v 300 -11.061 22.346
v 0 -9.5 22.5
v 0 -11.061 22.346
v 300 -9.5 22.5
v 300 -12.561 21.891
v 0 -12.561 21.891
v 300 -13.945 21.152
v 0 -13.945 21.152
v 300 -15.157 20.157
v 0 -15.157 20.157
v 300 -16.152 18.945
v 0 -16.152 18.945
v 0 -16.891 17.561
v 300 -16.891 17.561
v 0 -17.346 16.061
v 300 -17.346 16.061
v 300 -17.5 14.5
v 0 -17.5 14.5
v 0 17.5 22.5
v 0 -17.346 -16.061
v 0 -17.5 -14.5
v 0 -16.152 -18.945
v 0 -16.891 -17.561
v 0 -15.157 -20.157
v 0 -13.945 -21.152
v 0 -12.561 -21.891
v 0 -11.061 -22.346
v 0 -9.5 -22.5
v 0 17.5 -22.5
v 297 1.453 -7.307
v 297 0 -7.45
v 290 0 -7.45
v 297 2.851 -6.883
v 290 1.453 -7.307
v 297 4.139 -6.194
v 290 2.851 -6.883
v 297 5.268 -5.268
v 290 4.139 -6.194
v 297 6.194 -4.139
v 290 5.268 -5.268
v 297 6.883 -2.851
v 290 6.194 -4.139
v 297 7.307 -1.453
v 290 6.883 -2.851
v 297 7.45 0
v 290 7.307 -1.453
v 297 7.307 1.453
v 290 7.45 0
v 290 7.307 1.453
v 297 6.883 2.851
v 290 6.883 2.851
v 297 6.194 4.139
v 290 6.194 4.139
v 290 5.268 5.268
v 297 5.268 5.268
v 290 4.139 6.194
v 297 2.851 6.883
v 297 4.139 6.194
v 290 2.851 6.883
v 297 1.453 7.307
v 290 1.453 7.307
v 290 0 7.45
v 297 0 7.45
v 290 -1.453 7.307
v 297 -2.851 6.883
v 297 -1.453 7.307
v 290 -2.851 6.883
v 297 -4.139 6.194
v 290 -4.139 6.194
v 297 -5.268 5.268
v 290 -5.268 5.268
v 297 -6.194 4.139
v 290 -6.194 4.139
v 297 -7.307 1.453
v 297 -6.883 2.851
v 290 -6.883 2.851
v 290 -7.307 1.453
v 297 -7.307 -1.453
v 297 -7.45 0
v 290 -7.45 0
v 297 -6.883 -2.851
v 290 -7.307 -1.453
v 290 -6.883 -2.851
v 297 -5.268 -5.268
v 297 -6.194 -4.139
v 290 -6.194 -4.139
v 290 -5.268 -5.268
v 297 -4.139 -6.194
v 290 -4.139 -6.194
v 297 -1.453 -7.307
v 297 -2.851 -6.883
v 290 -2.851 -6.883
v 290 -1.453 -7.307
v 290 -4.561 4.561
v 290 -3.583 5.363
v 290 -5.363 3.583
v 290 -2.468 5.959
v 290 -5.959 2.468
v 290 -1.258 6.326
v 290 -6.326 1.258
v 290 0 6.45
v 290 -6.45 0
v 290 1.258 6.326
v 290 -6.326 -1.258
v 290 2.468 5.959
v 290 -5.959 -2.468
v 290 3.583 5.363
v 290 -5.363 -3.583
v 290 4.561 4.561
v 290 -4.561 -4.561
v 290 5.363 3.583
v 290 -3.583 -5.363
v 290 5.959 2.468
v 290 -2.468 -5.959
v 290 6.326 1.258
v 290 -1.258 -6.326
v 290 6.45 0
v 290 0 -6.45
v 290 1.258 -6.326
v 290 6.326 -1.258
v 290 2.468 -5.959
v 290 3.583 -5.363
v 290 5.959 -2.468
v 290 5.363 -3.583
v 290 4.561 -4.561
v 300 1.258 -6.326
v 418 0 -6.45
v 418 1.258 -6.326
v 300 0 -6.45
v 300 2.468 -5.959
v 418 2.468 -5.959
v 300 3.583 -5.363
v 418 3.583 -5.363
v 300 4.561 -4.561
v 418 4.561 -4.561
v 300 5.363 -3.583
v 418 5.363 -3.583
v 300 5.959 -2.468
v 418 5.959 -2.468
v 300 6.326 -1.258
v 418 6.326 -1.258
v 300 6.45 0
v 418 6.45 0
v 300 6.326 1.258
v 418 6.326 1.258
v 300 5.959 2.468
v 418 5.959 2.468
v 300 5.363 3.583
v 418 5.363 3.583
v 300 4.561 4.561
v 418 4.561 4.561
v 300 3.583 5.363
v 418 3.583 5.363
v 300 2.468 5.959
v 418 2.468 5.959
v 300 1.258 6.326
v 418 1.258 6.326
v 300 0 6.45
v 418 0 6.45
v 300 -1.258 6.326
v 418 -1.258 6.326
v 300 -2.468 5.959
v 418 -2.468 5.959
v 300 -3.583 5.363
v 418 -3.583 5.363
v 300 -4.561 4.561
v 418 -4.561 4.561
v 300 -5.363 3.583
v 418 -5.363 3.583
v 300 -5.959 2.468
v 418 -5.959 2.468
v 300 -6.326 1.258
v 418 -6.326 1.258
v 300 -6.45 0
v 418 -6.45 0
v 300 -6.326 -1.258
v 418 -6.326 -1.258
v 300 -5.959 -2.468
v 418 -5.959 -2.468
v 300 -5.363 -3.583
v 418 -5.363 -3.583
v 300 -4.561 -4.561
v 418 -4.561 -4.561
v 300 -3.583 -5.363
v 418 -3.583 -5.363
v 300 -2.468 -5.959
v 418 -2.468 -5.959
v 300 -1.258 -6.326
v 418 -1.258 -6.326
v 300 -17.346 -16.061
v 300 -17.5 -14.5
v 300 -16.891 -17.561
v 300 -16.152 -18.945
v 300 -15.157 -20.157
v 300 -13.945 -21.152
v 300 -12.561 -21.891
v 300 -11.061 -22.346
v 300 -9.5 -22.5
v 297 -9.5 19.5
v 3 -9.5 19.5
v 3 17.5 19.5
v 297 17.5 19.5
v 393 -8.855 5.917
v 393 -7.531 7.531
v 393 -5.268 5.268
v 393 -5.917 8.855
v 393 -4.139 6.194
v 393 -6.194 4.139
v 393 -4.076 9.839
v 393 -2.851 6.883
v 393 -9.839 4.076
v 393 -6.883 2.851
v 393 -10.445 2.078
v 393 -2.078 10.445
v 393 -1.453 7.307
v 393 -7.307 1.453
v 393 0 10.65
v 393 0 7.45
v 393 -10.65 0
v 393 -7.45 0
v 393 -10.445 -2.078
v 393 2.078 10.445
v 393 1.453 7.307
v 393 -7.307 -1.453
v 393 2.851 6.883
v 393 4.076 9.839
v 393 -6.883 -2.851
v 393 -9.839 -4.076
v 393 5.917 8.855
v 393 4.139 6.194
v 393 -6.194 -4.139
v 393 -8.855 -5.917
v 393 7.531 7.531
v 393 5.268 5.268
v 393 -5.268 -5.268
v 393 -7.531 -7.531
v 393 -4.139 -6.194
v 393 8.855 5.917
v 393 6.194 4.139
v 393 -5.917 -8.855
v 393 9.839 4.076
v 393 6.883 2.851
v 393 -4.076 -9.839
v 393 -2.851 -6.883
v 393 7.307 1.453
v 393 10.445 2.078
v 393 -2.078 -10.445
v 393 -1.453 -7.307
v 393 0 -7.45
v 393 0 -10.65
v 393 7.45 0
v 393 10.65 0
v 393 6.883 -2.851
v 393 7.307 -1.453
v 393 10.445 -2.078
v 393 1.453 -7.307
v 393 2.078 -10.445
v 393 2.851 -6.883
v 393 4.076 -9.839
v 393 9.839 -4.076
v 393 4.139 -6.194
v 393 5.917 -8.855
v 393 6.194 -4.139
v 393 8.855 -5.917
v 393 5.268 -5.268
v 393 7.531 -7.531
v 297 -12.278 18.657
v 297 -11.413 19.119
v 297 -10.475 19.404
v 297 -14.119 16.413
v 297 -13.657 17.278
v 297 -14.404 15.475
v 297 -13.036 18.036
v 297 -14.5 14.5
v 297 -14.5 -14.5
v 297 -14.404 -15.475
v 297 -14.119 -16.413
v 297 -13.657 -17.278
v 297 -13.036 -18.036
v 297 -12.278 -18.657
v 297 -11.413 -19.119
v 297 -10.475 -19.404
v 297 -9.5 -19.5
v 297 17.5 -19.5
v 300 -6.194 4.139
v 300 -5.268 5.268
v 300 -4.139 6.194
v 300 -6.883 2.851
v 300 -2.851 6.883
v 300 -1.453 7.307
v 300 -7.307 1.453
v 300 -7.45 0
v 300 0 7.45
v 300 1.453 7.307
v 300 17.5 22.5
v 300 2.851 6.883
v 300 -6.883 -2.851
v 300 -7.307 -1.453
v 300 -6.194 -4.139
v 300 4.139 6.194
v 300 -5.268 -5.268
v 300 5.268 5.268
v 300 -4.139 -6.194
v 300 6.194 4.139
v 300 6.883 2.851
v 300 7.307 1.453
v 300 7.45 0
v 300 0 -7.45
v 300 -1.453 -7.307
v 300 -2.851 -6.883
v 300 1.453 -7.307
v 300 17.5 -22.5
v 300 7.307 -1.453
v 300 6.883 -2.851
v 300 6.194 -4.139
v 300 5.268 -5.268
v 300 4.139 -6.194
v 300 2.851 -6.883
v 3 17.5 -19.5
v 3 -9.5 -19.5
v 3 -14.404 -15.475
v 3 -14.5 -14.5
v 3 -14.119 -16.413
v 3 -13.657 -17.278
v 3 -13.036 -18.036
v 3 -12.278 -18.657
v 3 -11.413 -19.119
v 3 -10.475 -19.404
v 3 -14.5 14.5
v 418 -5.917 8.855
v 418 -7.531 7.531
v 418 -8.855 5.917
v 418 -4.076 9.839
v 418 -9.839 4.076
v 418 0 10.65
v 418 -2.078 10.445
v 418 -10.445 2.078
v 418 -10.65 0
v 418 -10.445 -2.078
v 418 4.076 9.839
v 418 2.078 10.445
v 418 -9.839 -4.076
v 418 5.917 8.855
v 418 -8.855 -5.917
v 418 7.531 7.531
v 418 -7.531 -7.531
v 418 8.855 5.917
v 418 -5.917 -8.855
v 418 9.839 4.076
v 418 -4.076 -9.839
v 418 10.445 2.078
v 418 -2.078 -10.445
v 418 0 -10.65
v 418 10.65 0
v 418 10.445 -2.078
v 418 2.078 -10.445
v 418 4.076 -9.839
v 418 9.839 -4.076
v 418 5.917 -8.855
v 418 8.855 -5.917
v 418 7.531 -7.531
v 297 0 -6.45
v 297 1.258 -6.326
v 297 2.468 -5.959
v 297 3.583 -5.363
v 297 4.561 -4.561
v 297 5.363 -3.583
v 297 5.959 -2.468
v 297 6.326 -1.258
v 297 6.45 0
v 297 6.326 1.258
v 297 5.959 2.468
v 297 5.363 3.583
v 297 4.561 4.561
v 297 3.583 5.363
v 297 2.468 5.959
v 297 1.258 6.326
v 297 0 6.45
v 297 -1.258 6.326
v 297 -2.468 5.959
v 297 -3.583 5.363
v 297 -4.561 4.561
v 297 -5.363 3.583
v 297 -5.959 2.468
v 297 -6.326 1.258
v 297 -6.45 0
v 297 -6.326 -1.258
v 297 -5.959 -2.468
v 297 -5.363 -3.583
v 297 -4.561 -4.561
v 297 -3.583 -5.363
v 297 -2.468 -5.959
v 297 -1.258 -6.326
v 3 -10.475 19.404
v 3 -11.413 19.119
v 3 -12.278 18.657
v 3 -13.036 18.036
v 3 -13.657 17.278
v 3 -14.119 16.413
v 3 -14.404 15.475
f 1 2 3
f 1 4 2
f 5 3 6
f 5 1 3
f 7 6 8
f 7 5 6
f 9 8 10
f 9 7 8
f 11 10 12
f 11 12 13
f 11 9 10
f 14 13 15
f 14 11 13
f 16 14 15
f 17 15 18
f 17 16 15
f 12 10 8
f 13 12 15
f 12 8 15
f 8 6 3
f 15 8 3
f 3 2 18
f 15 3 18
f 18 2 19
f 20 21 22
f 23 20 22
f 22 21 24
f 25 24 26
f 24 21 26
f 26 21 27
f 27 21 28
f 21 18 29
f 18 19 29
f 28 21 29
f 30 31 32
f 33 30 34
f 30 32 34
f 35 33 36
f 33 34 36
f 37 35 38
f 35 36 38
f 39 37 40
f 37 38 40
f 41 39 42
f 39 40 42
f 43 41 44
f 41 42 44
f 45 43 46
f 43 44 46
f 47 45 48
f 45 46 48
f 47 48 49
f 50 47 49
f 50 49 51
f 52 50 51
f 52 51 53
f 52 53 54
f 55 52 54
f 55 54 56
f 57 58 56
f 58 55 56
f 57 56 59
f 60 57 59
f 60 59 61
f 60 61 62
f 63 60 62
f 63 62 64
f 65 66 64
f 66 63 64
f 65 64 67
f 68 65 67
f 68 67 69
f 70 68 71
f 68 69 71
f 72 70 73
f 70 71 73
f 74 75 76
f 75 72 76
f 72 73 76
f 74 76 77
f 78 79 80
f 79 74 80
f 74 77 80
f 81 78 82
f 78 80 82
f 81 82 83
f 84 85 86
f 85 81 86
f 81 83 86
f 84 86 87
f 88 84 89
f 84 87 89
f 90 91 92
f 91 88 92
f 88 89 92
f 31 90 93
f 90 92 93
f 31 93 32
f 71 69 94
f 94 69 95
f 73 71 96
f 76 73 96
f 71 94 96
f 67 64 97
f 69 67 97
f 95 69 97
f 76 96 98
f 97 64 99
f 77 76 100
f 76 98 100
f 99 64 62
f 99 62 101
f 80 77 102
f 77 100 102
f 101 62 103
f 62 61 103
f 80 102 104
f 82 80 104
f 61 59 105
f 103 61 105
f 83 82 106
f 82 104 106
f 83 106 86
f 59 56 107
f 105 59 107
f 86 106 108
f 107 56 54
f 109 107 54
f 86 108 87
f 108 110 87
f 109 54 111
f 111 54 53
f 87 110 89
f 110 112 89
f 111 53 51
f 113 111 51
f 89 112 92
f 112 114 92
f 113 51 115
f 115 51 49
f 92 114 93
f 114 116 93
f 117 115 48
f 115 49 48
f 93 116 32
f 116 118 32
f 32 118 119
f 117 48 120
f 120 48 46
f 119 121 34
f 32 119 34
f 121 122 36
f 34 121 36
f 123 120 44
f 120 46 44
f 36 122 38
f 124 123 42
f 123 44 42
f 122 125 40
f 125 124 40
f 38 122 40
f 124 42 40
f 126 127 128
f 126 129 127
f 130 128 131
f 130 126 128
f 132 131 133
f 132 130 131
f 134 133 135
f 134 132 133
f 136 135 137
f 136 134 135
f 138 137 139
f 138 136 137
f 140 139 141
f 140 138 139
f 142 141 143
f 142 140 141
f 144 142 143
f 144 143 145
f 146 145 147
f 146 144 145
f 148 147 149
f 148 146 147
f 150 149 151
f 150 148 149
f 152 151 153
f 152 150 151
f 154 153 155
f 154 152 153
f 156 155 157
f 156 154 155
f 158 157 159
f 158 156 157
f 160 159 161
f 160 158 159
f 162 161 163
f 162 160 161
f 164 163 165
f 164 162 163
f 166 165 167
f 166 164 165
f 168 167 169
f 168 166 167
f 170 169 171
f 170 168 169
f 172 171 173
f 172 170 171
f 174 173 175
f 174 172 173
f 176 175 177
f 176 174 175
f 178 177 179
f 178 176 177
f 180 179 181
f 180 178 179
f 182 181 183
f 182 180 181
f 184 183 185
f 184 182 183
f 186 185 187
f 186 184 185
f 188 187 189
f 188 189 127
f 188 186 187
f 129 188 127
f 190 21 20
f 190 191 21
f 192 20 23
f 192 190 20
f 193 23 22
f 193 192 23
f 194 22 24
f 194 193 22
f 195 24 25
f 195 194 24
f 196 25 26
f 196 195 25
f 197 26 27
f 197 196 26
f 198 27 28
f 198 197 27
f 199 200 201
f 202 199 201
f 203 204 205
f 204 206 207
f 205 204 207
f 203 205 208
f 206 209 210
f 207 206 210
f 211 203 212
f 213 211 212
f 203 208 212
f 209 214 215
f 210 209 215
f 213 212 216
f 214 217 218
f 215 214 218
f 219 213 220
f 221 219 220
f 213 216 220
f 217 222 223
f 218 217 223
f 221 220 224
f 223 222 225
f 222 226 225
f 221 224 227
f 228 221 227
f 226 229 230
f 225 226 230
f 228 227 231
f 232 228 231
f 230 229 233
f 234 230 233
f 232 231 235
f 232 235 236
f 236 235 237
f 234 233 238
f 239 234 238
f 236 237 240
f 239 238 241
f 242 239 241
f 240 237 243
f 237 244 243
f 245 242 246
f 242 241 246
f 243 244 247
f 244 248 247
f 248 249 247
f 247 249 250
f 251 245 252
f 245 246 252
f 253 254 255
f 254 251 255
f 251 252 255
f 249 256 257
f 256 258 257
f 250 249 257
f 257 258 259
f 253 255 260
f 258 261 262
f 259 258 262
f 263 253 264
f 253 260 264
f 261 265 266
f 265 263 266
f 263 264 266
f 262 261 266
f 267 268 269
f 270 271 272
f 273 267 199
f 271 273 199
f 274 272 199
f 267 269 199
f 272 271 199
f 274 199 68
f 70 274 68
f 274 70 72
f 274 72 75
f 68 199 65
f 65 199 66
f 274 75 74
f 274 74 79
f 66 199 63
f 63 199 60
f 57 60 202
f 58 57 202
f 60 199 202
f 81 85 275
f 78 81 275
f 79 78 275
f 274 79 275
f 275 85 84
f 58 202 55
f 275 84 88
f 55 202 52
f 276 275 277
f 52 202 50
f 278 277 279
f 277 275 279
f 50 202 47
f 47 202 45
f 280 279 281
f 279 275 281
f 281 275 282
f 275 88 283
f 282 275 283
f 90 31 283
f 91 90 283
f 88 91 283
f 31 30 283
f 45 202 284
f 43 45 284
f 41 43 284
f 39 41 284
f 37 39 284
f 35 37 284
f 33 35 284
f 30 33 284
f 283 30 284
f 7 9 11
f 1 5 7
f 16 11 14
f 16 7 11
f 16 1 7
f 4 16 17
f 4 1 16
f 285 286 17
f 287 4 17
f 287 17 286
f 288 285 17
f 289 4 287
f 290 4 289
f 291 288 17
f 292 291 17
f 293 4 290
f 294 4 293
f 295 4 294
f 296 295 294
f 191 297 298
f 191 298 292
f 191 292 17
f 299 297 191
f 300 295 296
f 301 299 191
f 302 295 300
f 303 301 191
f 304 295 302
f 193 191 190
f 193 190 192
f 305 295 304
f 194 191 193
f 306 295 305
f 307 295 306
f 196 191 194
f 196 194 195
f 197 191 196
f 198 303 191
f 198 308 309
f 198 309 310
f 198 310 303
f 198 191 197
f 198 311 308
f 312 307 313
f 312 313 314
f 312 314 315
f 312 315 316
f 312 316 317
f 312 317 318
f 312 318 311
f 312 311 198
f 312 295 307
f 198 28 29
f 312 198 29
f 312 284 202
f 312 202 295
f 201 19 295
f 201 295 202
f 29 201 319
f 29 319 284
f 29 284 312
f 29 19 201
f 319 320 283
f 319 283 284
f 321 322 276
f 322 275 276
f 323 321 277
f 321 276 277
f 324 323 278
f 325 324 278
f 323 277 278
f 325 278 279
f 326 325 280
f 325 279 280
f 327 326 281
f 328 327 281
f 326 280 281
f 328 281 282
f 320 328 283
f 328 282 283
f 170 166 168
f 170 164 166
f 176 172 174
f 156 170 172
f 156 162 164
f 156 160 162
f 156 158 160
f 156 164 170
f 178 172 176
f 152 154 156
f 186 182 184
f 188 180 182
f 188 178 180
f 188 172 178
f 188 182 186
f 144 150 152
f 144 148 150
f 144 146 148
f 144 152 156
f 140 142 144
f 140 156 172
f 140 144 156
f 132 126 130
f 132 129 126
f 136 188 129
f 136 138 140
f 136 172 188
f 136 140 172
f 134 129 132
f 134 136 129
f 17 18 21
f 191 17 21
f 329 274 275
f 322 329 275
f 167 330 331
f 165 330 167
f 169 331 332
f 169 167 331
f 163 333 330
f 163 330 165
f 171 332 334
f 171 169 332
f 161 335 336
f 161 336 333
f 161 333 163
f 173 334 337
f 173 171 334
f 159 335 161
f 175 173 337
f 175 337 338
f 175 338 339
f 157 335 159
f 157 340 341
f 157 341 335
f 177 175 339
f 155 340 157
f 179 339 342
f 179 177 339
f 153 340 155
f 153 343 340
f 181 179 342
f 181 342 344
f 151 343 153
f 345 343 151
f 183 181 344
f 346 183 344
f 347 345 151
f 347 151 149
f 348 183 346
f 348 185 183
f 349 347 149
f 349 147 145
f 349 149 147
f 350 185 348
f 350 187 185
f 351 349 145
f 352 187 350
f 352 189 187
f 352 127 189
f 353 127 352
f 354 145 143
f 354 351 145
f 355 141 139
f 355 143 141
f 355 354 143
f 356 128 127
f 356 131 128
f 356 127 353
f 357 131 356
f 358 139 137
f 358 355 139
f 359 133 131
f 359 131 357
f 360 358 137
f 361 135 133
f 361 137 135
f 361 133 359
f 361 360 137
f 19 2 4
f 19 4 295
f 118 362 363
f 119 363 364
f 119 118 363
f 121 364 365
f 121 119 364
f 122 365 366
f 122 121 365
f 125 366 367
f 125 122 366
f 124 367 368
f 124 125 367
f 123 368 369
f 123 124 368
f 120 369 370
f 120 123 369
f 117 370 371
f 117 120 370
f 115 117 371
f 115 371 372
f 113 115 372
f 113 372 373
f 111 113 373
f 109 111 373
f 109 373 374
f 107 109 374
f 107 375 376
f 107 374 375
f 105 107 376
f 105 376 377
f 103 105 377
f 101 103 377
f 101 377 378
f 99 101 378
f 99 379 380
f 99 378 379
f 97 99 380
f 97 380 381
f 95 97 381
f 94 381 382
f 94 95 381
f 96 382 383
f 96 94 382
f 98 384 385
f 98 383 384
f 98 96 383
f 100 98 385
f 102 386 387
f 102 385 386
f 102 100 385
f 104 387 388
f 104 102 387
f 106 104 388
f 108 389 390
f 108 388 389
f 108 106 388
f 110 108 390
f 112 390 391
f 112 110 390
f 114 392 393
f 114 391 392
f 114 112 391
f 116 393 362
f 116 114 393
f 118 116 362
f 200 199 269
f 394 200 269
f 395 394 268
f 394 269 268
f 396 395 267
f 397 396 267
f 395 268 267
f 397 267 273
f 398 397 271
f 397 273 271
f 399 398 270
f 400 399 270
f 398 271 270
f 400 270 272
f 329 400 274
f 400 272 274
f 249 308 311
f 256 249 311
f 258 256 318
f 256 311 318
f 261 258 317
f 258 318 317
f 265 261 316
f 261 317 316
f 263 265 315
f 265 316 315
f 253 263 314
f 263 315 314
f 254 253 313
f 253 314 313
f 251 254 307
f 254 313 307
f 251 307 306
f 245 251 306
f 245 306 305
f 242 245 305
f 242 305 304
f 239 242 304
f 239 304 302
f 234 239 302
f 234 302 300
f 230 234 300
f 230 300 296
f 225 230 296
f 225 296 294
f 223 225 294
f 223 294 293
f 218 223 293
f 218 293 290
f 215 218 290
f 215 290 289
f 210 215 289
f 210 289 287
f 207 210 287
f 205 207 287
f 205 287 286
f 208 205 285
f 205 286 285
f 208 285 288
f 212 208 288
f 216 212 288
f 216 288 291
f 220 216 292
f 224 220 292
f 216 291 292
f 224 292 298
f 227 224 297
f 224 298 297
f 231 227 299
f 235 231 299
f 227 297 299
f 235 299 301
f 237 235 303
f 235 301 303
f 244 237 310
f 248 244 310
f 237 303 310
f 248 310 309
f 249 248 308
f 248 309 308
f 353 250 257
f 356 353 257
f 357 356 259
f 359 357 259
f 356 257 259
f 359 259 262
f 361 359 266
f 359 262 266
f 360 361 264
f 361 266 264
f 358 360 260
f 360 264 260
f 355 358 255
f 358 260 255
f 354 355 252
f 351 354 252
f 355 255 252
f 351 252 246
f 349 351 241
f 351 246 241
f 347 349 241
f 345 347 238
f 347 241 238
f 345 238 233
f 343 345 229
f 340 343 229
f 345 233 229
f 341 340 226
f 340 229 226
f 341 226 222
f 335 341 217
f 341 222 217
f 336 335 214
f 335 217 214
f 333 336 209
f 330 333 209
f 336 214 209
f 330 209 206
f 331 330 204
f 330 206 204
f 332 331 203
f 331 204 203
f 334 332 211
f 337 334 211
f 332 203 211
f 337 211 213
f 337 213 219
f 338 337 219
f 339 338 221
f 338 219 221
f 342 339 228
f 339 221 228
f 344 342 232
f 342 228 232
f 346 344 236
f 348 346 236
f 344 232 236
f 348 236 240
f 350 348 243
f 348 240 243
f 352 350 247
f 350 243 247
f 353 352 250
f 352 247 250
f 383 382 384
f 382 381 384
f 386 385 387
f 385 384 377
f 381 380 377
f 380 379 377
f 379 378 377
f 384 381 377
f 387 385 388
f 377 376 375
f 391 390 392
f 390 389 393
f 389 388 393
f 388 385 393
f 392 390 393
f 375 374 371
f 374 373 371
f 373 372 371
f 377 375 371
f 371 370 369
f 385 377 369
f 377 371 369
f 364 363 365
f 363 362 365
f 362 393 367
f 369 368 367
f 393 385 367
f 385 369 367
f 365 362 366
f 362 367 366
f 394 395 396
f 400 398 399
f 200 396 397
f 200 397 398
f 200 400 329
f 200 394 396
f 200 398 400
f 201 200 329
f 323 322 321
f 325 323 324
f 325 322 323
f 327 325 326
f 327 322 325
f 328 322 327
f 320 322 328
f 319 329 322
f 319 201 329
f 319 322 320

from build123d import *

# Parameters (mm, degrees)
SKETCH1_W           = 45
SKETCH1_H           = 35
BOSS_EXTRUDE1_DEPTH = 300
FILLET1_R           = 8
SHELL1_T            = -3
SKETCH3_R           = 7.45
SKETCH3_R_2         = 6.45
BOSS_EXTRUDE2_DEPTH = 103
SKETCH4_R           = 10.65
SKETCH4_R_2         = 6.45
BOSS_EXTRUDE3_DEPTH = 25


with BuildPart() as part:
    # Sketch1 → Boss-Extrude1 (new body)
    with BuildSketch(Plane(origin=(0, 0, 0), x_dir=(0, 0, -1), z_dir=(1, 0, 0))):
        Rectangle(SKETCH1_W, SKETCH1_H)
    extrude(amount=BOSS_EXTRUDE1_DEPTH)

    # Fillet1
    fillet1_edges = [part.edges().sort_by_distance(p)[0] for p in [
        (150, -17.5, -22.5),
        (150, -17.5, 22.5),
    ]]
    fillet(fillet1_edges, radius=FILLET1_R)

    # Shell1
    shell1_openings = [part.faces().sort_by_distance(p)[0] for p in [
        (150, 17.5, 0),
    ]]
    offset(amount=SHELL1_T, openings=shell1_openings, kind=Kind.INTERSECTION)

    # Sketch3 → Boss-Extrude2 (add)
    with BuildSketch(Plane(origin=(290, 0, 0), x_dir=(0, 0, -1), z_dir=(1, 0, 0))):
        Circle(SKETCH3_R)
        Circle(SKETCH3_R_2, mode=Mode.SUBTRACT)
    extrude(amount=BOSS_EXTRUDE2_DEPTH)

    # Sketch4 → Boss-Extrude3 (add)
    with BuildSketch(Plane(origin=(393, 0, 0), x_dir=(0, 0, -1), z_dir=(1, 0, 0))):
        Circle(SKETCH4_R)
        Circle(SKETCH4_R_2, mode=Mode.SUBTRACT)
    extrude(amount=BOSS_EXTRUDE3_DEPTH)


solid = part.part
